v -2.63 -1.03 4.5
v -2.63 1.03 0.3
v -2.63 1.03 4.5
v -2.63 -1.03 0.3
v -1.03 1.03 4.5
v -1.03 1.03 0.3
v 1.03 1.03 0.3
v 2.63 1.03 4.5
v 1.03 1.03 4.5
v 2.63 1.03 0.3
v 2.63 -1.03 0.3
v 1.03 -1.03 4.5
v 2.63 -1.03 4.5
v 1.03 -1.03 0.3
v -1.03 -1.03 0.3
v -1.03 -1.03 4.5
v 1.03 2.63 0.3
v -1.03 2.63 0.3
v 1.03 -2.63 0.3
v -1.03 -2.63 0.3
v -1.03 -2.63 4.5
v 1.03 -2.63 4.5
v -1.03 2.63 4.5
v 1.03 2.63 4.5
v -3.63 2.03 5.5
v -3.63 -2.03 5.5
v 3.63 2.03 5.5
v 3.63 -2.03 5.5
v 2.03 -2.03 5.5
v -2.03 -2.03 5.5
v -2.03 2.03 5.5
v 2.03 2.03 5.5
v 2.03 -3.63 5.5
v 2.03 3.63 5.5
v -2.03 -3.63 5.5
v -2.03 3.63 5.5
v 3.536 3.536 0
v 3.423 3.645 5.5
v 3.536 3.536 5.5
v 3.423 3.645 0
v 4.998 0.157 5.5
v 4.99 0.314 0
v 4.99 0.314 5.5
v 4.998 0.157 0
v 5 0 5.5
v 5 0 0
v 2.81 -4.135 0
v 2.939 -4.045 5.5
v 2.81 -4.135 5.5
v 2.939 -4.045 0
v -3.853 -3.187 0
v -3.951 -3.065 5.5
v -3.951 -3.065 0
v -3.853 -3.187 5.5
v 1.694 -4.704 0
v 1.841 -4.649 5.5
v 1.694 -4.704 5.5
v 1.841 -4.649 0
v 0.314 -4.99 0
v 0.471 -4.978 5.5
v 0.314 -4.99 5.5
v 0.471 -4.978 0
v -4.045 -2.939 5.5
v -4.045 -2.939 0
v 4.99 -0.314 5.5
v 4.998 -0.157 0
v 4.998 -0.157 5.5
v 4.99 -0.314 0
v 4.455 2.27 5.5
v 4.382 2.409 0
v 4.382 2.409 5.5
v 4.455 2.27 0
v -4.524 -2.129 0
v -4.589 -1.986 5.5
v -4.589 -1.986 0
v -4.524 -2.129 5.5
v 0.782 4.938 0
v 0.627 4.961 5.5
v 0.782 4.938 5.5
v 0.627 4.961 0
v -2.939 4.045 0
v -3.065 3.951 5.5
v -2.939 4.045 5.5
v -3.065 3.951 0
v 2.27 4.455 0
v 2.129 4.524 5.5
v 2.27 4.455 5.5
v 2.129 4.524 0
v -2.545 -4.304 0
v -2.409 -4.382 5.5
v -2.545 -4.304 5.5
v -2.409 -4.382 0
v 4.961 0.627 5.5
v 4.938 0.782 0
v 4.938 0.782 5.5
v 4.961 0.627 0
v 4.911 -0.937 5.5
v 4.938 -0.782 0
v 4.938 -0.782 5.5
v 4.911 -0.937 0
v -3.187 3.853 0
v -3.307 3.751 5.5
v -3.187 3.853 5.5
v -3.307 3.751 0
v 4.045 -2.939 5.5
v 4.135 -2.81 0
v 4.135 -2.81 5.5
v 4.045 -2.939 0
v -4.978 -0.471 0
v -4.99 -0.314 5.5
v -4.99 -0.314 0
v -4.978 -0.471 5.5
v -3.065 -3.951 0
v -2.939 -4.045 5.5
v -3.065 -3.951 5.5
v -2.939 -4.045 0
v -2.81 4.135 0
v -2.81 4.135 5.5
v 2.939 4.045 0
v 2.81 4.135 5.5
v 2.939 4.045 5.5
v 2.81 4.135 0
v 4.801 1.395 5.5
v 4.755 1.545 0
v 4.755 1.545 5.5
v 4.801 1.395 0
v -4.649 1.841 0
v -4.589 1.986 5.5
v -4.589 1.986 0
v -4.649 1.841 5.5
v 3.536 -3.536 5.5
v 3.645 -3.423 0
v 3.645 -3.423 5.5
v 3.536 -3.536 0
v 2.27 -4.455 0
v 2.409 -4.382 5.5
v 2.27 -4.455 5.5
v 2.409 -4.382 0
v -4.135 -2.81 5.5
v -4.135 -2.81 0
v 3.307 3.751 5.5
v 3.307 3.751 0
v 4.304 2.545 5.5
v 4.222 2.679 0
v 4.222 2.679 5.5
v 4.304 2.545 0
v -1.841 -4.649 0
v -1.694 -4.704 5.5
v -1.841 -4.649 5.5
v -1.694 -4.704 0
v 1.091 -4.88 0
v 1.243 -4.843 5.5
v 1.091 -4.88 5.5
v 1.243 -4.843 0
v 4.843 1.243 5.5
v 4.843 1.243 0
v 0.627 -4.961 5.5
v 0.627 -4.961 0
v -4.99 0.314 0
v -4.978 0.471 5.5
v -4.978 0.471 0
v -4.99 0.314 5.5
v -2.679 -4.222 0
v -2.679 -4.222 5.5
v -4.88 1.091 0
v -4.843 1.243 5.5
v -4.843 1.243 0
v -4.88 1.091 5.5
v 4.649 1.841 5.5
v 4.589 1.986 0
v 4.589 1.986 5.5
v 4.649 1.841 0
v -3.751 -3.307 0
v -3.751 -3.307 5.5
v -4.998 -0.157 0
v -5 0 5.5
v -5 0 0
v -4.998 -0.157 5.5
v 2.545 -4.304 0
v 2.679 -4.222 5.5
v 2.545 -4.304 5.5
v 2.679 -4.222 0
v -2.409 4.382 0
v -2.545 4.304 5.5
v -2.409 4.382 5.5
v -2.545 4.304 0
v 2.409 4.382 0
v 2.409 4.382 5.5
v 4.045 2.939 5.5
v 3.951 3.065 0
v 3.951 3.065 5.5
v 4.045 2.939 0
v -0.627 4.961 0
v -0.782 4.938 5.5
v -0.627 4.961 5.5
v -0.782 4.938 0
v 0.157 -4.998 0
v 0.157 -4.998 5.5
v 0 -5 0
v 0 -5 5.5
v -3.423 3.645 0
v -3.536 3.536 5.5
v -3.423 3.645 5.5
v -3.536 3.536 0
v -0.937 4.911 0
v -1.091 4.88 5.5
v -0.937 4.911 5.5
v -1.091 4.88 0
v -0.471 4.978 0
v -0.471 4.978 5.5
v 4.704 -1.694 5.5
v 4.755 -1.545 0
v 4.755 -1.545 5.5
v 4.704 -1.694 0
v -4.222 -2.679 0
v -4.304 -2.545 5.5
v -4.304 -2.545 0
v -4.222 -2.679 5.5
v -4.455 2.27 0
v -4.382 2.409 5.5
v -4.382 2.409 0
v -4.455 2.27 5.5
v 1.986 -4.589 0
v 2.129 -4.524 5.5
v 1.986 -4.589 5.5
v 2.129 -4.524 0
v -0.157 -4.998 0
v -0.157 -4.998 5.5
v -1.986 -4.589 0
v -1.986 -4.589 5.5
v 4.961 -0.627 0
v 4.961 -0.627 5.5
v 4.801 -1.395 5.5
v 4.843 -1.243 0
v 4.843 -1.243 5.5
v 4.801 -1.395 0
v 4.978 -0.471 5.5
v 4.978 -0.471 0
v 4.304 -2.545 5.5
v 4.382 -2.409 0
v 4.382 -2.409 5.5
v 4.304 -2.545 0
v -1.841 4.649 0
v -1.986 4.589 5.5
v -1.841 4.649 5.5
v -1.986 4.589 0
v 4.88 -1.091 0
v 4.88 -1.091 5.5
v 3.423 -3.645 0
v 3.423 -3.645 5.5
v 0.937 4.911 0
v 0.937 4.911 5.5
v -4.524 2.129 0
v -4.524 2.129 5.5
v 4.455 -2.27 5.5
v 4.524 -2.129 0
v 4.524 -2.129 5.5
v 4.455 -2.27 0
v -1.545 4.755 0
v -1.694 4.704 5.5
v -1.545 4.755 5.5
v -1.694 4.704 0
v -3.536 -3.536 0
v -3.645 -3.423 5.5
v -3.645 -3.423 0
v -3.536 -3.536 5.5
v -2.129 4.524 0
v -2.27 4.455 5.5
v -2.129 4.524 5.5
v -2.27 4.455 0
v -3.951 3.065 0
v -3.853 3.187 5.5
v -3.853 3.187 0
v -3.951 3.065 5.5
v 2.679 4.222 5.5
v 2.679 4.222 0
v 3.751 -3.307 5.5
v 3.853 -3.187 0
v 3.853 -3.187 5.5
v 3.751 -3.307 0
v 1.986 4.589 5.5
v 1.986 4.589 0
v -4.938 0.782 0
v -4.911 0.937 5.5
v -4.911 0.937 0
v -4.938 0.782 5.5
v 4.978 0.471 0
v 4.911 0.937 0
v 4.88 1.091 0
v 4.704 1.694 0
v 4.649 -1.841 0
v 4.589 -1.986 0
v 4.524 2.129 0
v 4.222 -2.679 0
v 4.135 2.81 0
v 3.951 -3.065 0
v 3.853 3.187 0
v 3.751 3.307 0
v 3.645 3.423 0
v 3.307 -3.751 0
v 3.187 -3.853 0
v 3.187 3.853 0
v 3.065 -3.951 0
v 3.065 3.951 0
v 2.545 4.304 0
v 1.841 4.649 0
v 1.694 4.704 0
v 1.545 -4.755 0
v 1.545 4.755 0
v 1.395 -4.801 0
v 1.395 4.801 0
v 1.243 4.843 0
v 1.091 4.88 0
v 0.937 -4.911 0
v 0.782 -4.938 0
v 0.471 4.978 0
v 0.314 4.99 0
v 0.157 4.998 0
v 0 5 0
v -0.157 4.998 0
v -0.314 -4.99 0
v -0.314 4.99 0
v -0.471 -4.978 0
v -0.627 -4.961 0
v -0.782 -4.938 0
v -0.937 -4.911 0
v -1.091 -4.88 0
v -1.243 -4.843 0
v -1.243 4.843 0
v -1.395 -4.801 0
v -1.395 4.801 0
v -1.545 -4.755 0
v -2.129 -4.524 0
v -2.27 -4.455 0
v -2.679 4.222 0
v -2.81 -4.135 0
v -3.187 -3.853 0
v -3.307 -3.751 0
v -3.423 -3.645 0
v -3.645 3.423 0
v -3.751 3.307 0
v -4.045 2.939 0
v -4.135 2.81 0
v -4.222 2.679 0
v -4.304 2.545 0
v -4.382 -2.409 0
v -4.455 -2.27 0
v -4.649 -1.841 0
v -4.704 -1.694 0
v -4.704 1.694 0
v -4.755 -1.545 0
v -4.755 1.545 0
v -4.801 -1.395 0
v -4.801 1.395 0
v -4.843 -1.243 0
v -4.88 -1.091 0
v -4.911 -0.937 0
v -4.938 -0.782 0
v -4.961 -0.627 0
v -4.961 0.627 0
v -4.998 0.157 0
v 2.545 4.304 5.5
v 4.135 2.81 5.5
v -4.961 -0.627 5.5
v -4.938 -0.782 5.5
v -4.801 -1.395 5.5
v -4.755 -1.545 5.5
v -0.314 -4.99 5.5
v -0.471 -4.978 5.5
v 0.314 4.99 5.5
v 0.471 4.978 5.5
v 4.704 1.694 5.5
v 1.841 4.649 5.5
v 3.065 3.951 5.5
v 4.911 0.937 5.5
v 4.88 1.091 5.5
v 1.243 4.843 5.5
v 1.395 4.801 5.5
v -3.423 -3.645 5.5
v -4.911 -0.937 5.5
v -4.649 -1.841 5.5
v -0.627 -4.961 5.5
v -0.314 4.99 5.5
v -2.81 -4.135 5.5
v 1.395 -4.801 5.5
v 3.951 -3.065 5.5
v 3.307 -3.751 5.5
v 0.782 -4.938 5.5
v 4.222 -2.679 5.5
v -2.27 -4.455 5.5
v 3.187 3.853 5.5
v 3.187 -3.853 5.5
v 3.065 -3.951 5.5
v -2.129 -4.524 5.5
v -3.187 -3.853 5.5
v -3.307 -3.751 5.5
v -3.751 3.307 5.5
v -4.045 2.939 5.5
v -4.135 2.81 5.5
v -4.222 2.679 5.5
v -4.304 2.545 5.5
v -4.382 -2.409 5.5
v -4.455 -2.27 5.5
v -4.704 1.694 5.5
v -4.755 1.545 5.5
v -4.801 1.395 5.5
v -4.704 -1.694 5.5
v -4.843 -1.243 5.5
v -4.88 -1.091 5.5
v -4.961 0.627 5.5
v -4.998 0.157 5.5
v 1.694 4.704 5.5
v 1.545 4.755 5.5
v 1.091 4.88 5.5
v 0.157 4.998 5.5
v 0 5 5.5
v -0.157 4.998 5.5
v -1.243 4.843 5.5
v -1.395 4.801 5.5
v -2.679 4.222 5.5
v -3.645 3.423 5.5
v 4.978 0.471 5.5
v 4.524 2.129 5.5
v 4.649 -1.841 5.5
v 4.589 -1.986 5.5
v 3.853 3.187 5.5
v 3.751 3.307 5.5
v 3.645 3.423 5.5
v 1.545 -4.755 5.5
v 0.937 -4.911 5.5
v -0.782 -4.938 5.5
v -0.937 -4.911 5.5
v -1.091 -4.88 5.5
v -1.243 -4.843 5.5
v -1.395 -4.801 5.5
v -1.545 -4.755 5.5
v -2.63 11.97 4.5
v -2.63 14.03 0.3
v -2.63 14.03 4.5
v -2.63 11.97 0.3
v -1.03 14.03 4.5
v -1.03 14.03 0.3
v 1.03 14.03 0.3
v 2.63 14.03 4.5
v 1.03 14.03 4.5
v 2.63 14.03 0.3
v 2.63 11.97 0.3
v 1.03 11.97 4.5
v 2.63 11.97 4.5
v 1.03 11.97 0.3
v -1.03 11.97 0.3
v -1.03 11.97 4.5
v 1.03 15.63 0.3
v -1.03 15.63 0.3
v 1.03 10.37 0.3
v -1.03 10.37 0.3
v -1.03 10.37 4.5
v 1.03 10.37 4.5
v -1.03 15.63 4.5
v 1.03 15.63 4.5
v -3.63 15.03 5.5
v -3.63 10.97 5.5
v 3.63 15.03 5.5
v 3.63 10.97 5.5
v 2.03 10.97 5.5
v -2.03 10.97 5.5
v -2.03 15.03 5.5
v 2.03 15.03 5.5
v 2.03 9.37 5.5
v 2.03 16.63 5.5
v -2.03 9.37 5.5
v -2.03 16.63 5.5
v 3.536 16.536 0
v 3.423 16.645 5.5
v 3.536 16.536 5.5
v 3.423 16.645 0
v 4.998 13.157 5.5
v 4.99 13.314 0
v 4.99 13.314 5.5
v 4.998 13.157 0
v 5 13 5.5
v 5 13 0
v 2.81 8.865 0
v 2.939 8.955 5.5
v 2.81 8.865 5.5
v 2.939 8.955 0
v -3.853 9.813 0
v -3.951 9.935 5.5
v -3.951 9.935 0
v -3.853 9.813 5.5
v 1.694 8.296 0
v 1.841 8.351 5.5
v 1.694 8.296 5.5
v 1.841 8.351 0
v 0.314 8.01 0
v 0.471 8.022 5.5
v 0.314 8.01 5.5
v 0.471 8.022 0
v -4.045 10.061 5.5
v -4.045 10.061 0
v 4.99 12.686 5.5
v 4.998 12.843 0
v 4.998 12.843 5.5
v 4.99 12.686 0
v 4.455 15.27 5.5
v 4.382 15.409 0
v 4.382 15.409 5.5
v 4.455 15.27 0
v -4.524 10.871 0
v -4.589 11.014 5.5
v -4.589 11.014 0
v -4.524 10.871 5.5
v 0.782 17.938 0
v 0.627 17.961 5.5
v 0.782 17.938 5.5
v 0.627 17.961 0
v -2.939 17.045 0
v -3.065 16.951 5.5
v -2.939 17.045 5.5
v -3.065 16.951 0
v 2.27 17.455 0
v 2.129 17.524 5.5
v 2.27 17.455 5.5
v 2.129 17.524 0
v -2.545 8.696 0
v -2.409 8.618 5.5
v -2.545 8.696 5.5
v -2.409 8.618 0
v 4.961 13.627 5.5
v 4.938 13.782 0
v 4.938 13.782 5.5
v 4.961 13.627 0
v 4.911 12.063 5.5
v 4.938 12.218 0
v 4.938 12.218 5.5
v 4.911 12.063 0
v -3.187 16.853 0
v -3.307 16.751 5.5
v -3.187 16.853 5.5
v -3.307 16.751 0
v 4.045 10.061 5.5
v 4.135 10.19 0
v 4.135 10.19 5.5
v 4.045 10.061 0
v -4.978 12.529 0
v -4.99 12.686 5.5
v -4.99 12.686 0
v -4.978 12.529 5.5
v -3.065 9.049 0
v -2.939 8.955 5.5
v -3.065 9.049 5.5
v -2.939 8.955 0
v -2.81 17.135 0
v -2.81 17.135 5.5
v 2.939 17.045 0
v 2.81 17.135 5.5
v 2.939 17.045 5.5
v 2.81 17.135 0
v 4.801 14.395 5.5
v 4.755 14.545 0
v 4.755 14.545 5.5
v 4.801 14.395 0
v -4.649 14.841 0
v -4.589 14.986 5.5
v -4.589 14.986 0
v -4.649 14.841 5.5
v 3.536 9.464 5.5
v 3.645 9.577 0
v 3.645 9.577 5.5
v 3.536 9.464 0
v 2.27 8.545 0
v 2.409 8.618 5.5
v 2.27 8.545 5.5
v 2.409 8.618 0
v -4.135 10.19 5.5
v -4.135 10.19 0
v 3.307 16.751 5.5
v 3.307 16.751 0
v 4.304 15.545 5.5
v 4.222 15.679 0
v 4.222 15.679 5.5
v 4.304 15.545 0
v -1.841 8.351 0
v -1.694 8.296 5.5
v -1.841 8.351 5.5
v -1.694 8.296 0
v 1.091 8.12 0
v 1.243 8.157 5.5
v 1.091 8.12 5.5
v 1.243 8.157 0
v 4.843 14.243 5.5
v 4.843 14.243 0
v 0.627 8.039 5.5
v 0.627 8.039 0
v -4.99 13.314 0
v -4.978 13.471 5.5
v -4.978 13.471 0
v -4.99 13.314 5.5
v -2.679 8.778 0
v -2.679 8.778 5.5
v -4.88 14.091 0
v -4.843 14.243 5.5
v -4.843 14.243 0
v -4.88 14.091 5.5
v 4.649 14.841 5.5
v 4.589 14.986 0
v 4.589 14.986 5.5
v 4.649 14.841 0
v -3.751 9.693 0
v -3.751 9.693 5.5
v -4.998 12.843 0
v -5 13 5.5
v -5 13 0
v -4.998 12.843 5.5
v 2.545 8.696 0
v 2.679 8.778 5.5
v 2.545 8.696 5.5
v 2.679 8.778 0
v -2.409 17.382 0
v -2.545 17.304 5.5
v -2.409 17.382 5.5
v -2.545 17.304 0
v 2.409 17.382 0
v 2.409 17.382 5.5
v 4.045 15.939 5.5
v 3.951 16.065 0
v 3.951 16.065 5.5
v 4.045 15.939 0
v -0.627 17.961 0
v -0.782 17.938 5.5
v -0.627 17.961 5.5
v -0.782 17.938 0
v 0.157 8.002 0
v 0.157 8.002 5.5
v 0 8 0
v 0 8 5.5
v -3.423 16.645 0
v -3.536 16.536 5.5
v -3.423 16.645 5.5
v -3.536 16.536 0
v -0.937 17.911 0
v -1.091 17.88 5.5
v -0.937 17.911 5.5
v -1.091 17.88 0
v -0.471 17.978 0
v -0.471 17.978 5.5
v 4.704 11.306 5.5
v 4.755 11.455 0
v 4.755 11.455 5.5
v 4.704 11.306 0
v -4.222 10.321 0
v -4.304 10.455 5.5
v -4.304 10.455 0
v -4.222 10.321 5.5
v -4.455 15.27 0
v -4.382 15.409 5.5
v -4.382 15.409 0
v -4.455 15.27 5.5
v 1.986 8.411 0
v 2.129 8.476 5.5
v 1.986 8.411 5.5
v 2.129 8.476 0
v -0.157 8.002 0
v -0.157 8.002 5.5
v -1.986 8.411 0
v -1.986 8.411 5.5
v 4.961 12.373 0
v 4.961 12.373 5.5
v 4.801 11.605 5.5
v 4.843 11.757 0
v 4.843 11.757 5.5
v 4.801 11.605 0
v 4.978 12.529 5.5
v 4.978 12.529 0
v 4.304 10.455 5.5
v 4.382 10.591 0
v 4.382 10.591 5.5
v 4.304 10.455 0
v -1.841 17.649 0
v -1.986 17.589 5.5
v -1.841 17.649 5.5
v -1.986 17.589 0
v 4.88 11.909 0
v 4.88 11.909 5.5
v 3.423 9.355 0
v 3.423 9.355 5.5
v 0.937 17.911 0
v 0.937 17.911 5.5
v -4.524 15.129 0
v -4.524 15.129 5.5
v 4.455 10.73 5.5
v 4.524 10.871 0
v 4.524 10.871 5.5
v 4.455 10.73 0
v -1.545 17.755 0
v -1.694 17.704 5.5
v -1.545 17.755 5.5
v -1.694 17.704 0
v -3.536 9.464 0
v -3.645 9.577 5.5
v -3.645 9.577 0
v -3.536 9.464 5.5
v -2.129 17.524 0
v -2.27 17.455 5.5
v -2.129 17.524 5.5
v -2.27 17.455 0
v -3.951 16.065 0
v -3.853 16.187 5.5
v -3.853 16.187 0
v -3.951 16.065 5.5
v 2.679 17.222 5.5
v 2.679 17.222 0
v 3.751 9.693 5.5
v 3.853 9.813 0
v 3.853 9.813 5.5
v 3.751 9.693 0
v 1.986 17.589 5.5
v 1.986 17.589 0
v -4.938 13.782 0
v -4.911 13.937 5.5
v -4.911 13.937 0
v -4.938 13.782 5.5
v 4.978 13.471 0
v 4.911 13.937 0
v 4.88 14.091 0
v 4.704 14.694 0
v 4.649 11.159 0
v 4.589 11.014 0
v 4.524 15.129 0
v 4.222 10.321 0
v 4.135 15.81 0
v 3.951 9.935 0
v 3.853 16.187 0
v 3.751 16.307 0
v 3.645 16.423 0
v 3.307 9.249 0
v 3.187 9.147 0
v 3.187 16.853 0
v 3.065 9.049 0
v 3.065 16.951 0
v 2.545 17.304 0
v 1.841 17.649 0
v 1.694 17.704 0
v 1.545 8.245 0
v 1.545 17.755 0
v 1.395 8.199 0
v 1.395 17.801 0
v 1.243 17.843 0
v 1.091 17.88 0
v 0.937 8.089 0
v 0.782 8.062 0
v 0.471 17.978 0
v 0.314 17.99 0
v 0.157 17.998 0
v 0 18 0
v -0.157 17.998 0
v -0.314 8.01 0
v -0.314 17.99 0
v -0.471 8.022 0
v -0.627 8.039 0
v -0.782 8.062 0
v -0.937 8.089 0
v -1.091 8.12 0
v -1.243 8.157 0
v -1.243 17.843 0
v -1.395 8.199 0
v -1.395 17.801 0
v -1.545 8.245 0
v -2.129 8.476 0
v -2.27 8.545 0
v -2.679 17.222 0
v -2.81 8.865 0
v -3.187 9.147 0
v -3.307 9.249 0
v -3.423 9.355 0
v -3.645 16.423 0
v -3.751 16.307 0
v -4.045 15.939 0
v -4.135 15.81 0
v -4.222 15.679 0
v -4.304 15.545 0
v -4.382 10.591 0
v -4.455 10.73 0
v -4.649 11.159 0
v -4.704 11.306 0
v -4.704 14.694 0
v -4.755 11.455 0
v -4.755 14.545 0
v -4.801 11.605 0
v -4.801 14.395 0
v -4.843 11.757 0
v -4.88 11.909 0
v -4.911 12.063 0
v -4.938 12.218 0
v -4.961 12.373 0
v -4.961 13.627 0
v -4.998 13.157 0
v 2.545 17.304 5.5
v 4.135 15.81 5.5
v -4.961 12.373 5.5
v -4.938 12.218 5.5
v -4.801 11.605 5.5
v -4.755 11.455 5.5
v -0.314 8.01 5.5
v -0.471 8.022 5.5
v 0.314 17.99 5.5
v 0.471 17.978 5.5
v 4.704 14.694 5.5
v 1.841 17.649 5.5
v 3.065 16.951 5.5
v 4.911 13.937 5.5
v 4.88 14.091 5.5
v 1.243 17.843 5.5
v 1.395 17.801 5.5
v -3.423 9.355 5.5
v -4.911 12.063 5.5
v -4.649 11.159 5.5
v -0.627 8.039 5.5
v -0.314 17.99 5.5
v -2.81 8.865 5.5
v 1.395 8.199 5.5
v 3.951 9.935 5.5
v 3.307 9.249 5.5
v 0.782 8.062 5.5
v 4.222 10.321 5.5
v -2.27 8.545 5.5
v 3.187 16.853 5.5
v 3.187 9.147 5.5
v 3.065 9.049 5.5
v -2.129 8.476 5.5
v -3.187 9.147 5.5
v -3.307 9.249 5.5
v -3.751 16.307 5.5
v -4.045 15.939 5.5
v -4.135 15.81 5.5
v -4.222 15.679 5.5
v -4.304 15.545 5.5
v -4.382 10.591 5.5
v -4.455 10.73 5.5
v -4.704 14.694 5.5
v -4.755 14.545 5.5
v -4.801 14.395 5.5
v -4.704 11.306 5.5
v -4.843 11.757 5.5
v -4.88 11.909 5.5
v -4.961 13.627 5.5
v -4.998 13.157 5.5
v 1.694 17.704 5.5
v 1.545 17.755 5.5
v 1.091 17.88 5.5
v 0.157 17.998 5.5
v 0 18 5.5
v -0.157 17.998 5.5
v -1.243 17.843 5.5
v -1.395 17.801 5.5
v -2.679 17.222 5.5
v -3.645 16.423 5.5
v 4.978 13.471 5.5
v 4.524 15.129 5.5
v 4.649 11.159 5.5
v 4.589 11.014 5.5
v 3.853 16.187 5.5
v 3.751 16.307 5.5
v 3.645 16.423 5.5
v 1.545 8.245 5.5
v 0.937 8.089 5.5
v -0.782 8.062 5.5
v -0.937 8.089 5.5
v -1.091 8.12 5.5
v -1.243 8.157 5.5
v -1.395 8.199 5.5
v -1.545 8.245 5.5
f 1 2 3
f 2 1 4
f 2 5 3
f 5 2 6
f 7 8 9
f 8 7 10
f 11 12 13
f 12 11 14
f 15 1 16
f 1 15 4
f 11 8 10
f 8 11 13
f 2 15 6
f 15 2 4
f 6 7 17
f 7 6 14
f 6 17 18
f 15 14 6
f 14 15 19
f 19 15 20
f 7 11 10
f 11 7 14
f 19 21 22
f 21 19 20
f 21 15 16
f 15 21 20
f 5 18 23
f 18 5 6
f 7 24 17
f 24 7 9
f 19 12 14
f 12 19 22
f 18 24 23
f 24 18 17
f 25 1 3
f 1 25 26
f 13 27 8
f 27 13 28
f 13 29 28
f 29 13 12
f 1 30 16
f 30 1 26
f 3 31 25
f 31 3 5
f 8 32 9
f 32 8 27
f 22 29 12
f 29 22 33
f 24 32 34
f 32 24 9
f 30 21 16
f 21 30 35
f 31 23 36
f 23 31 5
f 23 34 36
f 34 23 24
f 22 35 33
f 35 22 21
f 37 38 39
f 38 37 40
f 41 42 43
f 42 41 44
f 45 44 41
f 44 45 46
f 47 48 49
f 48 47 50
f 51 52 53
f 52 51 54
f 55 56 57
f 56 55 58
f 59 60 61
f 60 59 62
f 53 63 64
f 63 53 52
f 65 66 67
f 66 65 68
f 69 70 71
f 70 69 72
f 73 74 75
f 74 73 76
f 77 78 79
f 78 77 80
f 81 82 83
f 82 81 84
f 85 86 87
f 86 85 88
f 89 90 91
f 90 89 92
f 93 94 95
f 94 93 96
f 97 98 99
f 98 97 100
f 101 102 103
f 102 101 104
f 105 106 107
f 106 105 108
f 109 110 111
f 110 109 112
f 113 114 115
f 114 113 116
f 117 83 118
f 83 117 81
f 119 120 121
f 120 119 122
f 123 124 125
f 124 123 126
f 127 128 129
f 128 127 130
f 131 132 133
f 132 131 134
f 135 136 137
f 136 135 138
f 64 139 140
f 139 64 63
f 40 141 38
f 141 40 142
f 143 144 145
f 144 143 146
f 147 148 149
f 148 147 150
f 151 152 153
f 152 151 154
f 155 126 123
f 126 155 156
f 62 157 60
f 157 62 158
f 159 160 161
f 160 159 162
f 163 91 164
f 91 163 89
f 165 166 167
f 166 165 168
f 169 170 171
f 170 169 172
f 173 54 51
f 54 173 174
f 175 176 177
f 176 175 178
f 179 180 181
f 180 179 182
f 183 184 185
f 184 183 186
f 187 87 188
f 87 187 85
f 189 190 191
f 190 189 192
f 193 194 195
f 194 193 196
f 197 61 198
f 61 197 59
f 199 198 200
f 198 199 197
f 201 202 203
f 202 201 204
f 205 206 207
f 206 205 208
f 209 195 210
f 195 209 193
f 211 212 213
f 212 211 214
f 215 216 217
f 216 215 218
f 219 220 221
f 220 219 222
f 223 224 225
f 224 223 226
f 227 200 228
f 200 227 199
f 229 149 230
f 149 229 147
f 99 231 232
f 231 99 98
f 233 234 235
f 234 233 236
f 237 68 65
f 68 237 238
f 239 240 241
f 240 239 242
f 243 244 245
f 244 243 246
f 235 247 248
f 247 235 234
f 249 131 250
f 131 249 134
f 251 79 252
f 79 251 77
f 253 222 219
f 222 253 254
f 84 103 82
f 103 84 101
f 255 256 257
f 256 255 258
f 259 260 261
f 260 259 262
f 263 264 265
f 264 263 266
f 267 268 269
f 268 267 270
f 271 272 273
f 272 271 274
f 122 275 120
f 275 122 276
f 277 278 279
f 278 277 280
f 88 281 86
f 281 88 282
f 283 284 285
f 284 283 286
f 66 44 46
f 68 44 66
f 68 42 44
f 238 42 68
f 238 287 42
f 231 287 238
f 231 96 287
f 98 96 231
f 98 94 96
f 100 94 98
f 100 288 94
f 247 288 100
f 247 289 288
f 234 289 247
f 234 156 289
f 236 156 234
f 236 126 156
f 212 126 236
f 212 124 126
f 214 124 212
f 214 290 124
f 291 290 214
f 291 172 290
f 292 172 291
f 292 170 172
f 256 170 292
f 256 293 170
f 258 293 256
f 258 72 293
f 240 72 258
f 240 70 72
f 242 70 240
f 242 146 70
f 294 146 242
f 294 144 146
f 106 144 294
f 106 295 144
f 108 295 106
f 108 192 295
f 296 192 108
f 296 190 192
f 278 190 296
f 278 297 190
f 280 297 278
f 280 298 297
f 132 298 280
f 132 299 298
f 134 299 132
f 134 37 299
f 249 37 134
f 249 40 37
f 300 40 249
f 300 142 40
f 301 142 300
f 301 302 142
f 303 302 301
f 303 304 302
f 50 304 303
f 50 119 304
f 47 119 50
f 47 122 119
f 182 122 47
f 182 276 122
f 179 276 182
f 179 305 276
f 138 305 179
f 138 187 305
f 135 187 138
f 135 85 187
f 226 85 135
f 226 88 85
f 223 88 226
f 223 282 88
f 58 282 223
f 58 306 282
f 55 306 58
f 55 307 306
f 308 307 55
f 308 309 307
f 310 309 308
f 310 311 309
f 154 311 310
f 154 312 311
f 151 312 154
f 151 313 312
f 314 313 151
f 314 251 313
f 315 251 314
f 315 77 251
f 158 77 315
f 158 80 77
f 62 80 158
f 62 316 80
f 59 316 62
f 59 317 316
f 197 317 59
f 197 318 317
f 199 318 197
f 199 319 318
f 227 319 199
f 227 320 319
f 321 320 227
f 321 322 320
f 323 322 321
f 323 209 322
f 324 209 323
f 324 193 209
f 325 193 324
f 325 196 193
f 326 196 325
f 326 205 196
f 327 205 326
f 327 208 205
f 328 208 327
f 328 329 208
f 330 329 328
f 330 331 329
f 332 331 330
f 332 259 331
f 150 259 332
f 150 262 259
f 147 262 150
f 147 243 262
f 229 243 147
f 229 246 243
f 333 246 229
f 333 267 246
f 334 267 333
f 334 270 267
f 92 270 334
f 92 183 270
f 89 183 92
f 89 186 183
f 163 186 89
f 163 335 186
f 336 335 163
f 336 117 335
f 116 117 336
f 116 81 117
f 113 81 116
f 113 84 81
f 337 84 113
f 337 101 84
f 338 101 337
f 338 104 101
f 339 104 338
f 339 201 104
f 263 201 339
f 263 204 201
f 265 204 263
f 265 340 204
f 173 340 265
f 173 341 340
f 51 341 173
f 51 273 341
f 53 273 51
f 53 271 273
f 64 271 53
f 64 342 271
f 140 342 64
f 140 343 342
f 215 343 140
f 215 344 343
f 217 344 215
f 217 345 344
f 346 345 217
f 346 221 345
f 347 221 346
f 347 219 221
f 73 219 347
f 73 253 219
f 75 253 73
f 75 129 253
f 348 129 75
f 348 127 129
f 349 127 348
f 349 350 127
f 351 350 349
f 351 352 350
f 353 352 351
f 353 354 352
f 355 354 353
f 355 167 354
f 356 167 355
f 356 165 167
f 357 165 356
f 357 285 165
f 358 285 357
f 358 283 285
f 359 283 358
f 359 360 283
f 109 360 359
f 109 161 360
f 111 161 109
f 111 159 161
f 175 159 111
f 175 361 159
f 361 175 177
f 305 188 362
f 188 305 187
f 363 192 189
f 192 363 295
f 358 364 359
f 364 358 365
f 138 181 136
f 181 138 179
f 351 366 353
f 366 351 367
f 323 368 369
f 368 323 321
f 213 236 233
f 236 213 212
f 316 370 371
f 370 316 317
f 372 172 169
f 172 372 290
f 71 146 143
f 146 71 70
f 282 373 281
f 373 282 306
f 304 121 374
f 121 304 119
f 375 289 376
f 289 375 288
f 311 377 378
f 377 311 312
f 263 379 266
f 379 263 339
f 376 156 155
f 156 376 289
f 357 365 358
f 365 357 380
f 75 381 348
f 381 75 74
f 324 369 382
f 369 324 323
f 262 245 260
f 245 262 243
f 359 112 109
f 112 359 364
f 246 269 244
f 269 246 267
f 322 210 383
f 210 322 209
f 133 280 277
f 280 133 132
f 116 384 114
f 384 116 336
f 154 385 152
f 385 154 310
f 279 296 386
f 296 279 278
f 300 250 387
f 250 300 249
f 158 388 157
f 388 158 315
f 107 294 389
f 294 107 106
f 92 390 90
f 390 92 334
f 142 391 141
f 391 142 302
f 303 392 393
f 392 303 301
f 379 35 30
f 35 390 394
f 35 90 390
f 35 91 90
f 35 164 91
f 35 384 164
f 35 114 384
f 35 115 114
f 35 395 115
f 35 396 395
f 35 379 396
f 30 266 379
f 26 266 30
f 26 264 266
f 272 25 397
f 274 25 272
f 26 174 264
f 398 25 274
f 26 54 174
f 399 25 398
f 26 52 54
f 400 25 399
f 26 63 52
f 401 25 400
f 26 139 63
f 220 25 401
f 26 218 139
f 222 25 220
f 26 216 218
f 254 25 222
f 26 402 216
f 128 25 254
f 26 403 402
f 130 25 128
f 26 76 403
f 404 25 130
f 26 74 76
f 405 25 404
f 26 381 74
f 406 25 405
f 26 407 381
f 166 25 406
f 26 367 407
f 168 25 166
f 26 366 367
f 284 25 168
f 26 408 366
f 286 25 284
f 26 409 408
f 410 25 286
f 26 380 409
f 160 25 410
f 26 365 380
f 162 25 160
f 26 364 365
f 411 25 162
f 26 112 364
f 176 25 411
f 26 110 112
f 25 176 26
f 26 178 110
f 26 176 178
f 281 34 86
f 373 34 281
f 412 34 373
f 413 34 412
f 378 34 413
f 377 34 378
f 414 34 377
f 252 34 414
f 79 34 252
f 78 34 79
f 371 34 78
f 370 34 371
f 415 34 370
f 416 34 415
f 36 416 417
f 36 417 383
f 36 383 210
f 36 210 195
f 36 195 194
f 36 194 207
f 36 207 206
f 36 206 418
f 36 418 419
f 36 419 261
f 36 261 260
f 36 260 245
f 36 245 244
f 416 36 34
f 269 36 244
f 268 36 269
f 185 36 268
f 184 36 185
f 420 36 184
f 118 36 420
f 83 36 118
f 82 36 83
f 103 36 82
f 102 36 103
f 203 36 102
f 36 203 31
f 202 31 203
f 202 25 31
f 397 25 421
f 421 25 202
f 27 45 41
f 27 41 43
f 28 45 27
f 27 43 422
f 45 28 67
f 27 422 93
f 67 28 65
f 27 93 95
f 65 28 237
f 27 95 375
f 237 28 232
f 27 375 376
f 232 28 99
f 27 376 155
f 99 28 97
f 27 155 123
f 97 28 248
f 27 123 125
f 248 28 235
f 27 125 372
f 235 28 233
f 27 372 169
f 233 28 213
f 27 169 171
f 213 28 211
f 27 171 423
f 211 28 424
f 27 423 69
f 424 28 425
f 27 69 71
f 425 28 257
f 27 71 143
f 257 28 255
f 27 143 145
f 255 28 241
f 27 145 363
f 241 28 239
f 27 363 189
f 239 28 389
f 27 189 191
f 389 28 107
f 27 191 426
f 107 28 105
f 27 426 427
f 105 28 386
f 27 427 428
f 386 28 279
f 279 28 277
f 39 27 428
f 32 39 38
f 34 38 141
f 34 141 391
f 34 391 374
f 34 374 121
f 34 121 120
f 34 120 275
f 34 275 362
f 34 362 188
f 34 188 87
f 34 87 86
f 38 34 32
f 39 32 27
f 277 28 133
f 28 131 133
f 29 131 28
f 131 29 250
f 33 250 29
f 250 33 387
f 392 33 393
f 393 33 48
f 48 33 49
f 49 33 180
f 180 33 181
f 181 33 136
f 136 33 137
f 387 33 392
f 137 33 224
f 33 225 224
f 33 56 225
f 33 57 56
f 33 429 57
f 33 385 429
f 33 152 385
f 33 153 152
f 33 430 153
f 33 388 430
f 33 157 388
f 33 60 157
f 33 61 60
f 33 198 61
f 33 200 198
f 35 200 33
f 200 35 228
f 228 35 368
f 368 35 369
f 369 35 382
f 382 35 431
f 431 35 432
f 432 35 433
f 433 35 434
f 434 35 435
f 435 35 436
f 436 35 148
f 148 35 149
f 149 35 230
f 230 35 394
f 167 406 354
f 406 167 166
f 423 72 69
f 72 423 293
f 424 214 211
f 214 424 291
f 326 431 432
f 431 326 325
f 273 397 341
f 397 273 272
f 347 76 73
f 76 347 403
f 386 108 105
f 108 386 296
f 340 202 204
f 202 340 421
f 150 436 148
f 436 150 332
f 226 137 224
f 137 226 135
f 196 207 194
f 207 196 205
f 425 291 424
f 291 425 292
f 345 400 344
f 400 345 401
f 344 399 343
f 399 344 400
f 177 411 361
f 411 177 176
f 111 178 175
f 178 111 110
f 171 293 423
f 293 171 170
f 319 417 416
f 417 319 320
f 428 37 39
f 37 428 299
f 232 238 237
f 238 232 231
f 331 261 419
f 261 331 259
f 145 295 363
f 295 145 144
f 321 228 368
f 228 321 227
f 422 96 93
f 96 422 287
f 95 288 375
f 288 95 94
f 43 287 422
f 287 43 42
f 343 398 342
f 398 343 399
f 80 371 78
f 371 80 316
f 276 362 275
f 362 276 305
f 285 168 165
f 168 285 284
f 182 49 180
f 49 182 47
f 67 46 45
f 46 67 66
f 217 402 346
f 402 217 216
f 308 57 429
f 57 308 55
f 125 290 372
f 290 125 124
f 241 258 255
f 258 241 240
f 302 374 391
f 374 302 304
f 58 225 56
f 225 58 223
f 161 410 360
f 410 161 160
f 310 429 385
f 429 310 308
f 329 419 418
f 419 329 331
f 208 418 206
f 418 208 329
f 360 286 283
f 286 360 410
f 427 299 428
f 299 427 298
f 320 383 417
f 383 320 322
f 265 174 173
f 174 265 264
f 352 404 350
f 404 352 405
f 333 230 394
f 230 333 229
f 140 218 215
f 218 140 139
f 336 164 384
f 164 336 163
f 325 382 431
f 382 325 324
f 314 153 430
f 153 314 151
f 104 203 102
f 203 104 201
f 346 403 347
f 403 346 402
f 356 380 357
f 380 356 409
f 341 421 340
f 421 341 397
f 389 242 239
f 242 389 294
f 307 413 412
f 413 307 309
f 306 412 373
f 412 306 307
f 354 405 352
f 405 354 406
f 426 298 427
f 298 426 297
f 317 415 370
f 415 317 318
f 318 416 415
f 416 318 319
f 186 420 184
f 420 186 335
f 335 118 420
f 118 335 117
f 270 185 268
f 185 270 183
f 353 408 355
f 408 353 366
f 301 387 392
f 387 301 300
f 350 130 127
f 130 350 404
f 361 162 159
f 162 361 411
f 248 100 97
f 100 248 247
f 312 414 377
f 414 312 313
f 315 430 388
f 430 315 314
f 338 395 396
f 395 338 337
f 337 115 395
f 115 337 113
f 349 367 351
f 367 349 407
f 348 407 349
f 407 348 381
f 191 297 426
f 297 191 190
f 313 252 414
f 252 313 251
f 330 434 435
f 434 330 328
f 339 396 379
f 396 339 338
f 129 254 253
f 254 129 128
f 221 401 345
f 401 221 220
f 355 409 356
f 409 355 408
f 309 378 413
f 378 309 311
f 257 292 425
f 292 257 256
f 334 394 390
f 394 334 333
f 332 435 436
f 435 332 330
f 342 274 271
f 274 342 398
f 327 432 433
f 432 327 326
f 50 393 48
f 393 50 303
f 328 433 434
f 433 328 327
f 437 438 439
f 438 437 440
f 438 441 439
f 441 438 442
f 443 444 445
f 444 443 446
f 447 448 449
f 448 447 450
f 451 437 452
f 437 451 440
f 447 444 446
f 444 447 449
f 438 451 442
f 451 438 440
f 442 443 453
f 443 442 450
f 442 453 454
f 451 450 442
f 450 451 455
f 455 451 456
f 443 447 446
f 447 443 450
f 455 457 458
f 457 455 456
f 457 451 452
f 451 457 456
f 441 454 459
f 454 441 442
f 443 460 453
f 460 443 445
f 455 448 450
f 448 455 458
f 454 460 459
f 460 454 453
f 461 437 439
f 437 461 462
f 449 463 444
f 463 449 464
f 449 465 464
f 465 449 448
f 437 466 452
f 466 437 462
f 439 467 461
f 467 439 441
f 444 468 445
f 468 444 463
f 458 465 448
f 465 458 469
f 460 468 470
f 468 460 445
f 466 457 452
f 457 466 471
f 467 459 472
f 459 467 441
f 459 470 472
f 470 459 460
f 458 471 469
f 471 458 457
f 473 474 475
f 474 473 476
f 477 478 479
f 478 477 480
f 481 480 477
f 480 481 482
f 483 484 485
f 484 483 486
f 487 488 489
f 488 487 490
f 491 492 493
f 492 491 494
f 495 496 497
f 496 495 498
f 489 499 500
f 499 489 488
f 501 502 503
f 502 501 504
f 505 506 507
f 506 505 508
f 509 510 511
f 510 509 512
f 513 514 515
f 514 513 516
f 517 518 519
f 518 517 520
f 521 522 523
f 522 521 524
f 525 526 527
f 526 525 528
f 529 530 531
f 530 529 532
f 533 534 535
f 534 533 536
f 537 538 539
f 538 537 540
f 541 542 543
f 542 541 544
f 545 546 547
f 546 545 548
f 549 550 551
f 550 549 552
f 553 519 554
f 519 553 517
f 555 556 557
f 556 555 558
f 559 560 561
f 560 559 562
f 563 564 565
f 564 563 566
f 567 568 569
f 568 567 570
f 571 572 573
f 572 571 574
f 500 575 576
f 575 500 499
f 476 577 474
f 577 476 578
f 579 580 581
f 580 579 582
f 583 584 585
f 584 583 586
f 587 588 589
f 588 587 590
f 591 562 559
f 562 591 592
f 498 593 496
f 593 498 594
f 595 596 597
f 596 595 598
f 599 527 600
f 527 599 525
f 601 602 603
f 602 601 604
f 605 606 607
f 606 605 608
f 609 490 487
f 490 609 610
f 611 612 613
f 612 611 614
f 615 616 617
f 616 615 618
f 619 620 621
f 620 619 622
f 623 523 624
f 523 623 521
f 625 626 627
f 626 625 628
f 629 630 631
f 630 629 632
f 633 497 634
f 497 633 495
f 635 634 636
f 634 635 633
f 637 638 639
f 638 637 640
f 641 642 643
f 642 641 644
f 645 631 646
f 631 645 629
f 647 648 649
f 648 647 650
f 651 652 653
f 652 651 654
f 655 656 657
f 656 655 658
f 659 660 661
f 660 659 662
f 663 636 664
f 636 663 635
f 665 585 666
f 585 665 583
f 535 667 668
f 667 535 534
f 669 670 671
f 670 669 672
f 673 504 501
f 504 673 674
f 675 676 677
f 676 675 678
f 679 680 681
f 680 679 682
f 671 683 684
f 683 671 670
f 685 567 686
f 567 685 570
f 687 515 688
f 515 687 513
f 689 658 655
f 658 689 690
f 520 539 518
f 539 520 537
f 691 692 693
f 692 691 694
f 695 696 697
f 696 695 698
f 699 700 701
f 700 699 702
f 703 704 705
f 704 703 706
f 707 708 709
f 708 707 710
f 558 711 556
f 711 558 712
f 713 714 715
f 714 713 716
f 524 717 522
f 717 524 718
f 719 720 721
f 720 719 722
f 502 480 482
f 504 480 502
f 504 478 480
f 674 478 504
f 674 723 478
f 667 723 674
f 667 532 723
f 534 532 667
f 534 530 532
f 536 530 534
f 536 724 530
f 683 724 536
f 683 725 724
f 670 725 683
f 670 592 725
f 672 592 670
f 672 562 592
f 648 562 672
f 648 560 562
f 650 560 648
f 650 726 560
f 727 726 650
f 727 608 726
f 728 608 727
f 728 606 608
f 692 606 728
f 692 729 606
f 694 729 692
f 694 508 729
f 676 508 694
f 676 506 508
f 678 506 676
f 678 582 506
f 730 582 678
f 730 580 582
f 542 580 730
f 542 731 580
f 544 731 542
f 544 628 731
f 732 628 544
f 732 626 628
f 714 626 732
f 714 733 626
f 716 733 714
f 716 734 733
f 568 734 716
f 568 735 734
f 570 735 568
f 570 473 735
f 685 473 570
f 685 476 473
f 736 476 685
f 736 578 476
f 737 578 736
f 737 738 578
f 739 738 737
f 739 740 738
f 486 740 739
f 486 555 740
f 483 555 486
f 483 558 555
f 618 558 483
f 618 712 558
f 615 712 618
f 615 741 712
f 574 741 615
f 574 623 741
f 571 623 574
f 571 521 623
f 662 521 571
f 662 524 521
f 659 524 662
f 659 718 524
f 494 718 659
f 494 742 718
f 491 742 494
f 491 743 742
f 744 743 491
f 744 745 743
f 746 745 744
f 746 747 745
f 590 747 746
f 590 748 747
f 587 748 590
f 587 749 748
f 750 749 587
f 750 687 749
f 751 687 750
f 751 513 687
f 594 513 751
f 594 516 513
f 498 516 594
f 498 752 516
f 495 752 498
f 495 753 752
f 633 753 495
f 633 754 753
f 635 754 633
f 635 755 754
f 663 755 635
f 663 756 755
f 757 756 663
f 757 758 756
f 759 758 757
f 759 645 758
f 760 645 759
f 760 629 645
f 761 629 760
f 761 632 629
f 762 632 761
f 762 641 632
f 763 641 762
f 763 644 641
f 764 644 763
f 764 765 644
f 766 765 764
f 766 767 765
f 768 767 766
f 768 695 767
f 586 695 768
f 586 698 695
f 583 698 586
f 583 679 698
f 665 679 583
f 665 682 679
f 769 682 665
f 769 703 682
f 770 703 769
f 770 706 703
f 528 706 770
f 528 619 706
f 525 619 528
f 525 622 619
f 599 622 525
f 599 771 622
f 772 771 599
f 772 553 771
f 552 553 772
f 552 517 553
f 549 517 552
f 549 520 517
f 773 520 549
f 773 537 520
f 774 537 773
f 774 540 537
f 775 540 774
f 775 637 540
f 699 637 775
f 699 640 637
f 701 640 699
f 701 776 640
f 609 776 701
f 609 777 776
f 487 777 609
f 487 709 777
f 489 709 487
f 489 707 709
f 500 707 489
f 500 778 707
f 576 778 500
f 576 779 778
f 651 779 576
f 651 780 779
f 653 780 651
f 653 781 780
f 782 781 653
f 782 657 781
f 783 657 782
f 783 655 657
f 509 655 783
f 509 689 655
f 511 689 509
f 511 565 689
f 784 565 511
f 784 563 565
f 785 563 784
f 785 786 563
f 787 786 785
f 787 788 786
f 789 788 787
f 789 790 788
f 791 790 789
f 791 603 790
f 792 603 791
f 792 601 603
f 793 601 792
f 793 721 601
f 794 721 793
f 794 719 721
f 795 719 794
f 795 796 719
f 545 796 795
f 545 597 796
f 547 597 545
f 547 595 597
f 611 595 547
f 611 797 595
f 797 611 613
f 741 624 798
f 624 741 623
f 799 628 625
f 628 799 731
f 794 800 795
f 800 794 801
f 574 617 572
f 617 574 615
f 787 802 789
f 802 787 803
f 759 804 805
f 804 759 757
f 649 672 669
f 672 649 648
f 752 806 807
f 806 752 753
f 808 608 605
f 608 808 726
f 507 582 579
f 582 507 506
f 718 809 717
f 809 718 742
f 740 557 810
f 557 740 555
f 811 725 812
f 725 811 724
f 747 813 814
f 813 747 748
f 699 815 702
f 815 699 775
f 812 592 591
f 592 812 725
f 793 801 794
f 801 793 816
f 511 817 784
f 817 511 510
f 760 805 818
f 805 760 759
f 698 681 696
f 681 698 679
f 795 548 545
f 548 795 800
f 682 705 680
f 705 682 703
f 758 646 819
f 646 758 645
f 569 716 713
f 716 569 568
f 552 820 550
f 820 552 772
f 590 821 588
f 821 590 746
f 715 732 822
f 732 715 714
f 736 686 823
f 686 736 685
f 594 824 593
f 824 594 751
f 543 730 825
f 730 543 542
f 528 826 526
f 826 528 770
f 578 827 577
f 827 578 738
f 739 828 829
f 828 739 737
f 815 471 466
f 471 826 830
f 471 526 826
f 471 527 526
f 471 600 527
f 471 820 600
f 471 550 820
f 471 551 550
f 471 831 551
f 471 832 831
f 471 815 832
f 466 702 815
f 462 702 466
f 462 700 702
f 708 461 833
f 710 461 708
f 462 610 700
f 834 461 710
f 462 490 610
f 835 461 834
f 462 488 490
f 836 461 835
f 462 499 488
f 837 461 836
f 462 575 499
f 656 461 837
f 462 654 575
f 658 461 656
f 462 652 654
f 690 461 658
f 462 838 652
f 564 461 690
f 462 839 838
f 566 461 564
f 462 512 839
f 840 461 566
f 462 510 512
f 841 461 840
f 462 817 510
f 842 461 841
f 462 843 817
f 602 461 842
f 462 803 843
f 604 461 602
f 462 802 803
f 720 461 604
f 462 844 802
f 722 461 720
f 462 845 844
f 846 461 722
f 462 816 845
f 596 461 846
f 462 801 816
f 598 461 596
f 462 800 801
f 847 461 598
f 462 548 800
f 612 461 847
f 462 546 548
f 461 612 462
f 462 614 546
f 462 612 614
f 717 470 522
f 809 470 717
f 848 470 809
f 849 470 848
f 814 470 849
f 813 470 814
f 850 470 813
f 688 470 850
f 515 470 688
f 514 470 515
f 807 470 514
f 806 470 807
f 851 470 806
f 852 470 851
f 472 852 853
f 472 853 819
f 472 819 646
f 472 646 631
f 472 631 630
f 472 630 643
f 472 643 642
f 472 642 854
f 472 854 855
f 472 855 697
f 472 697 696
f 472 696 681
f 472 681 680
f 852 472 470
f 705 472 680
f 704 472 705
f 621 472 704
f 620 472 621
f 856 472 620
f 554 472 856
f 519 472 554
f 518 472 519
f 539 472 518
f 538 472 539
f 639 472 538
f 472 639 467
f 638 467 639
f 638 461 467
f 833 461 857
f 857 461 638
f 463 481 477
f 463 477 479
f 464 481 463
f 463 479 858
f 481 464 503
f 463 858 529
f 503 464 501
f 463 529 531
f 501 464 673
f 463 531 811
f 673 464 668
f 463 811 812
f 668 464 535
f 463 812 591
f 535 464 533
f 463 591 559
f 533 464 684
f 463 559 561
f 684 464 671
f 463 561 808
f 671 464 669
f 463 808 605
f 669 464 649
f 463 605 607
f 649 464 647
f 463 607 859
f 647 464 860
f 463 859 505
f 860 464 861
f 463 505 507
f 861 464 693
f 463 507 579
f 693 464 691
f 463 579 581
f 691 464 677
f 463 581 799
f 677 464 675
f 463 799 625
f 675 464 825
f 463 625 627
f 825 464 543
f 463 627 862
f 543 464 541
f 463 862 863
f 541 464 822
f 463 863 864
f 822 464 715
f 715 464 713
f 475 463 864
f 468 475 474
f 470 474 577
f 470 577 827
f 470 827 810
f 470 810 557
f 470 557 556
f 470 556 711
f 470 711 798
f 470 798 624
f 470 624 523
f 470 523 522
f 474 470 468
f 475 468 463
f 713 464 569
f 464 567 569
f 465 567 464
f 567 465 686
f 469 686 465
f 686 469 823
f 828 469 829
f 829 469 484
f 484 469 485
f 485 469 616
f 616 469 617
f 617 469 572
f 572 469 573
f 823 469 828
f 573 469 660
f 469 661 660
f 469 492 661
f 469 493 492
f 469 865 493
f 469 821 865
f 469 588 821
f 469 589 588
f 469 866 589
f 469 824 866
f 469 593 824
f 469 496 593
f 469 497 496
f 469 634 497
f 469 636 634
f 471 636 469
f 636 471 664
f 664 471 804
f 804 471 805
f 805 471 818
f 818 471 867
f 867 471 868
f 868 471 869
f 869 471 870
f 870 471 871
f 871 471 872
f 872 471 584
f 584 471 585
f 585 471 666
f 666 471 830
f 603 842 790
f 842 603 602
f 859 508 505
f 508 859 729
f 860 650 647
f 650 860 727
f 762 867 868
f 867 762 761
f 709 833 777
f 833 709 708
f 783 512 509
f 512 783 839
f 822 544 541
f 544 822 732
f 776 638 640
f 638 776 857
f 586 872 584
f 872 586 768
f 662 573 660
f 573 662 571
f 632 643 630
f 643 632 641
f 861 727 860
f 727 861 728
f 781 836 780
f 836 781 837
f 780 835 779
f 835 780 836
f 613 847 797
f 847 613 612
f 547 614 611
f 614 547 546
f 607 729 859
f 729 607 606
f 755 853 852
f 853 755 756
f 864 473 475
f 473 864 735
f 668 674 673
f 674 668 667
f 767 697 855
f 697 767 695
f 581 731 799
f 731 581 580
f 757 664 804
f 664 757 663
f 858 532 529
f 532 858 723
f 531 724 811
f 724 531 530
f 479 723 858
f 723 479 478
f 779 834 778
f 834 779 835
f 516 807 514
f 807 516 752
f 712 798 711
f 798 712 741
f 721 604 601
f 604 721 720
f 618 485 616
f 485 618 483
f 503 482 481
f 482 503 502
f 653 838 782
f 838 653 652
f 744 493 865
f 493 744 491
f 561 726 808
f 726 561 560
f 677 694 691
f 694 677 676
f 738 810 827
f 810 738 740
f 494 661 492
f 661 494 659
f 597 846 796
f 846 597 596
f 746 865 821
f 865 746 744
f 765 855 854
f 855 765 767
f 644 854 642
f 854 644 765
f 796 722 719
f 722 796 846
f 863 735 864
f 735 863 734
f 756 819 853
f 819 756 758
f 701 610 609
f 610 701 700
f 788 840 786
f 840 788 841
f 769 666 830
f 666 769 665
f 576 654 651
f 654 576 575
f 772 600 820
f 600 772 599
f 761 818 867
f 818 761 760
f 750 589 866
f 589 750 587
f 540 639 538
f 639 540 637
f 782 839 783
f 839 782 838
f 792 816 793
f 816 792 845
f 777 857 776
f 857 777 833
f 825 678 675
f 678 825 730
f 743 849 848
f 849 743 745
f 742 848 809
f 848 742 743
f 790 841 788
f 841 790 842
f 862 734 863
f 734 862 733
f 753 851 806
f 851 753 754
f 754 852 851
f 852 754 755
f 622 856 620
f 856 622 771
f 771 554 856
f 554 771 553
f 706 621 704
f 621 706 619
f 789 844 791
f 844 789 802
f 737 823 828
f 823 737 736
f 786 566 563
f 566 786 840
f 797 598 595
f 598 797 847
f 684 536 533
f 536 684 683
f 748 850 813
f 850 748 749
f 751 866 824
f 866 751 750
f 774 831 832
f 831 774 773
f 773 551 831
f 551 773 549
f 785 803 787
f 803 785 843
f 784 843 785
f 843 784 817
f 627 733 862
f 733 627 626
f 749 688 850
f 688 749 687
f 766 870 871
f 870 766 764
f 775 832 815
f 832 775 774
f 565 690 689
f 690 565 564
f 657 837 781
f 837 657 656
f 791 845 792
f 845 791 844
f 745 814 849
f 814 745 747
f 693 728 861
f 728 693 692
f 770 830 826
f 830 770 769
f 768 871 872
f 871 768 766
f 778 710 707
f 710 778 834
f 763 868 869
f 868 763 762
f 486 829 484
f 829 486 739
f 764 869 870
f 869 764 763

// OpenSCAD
use <all.scad>

//servo_shaft_wrench();

module fixture() {
    h = 5.5;
    difference() {
        cylinder(d=10, h=h, $fn=200);

        translate([0, 0, .3])
        shaft_hollowing();

        translate([0, 0, h-1])
        shaft_hollowing(1, true);
    }
}

fixture();

translate([0, 13, 0])
fixture();
